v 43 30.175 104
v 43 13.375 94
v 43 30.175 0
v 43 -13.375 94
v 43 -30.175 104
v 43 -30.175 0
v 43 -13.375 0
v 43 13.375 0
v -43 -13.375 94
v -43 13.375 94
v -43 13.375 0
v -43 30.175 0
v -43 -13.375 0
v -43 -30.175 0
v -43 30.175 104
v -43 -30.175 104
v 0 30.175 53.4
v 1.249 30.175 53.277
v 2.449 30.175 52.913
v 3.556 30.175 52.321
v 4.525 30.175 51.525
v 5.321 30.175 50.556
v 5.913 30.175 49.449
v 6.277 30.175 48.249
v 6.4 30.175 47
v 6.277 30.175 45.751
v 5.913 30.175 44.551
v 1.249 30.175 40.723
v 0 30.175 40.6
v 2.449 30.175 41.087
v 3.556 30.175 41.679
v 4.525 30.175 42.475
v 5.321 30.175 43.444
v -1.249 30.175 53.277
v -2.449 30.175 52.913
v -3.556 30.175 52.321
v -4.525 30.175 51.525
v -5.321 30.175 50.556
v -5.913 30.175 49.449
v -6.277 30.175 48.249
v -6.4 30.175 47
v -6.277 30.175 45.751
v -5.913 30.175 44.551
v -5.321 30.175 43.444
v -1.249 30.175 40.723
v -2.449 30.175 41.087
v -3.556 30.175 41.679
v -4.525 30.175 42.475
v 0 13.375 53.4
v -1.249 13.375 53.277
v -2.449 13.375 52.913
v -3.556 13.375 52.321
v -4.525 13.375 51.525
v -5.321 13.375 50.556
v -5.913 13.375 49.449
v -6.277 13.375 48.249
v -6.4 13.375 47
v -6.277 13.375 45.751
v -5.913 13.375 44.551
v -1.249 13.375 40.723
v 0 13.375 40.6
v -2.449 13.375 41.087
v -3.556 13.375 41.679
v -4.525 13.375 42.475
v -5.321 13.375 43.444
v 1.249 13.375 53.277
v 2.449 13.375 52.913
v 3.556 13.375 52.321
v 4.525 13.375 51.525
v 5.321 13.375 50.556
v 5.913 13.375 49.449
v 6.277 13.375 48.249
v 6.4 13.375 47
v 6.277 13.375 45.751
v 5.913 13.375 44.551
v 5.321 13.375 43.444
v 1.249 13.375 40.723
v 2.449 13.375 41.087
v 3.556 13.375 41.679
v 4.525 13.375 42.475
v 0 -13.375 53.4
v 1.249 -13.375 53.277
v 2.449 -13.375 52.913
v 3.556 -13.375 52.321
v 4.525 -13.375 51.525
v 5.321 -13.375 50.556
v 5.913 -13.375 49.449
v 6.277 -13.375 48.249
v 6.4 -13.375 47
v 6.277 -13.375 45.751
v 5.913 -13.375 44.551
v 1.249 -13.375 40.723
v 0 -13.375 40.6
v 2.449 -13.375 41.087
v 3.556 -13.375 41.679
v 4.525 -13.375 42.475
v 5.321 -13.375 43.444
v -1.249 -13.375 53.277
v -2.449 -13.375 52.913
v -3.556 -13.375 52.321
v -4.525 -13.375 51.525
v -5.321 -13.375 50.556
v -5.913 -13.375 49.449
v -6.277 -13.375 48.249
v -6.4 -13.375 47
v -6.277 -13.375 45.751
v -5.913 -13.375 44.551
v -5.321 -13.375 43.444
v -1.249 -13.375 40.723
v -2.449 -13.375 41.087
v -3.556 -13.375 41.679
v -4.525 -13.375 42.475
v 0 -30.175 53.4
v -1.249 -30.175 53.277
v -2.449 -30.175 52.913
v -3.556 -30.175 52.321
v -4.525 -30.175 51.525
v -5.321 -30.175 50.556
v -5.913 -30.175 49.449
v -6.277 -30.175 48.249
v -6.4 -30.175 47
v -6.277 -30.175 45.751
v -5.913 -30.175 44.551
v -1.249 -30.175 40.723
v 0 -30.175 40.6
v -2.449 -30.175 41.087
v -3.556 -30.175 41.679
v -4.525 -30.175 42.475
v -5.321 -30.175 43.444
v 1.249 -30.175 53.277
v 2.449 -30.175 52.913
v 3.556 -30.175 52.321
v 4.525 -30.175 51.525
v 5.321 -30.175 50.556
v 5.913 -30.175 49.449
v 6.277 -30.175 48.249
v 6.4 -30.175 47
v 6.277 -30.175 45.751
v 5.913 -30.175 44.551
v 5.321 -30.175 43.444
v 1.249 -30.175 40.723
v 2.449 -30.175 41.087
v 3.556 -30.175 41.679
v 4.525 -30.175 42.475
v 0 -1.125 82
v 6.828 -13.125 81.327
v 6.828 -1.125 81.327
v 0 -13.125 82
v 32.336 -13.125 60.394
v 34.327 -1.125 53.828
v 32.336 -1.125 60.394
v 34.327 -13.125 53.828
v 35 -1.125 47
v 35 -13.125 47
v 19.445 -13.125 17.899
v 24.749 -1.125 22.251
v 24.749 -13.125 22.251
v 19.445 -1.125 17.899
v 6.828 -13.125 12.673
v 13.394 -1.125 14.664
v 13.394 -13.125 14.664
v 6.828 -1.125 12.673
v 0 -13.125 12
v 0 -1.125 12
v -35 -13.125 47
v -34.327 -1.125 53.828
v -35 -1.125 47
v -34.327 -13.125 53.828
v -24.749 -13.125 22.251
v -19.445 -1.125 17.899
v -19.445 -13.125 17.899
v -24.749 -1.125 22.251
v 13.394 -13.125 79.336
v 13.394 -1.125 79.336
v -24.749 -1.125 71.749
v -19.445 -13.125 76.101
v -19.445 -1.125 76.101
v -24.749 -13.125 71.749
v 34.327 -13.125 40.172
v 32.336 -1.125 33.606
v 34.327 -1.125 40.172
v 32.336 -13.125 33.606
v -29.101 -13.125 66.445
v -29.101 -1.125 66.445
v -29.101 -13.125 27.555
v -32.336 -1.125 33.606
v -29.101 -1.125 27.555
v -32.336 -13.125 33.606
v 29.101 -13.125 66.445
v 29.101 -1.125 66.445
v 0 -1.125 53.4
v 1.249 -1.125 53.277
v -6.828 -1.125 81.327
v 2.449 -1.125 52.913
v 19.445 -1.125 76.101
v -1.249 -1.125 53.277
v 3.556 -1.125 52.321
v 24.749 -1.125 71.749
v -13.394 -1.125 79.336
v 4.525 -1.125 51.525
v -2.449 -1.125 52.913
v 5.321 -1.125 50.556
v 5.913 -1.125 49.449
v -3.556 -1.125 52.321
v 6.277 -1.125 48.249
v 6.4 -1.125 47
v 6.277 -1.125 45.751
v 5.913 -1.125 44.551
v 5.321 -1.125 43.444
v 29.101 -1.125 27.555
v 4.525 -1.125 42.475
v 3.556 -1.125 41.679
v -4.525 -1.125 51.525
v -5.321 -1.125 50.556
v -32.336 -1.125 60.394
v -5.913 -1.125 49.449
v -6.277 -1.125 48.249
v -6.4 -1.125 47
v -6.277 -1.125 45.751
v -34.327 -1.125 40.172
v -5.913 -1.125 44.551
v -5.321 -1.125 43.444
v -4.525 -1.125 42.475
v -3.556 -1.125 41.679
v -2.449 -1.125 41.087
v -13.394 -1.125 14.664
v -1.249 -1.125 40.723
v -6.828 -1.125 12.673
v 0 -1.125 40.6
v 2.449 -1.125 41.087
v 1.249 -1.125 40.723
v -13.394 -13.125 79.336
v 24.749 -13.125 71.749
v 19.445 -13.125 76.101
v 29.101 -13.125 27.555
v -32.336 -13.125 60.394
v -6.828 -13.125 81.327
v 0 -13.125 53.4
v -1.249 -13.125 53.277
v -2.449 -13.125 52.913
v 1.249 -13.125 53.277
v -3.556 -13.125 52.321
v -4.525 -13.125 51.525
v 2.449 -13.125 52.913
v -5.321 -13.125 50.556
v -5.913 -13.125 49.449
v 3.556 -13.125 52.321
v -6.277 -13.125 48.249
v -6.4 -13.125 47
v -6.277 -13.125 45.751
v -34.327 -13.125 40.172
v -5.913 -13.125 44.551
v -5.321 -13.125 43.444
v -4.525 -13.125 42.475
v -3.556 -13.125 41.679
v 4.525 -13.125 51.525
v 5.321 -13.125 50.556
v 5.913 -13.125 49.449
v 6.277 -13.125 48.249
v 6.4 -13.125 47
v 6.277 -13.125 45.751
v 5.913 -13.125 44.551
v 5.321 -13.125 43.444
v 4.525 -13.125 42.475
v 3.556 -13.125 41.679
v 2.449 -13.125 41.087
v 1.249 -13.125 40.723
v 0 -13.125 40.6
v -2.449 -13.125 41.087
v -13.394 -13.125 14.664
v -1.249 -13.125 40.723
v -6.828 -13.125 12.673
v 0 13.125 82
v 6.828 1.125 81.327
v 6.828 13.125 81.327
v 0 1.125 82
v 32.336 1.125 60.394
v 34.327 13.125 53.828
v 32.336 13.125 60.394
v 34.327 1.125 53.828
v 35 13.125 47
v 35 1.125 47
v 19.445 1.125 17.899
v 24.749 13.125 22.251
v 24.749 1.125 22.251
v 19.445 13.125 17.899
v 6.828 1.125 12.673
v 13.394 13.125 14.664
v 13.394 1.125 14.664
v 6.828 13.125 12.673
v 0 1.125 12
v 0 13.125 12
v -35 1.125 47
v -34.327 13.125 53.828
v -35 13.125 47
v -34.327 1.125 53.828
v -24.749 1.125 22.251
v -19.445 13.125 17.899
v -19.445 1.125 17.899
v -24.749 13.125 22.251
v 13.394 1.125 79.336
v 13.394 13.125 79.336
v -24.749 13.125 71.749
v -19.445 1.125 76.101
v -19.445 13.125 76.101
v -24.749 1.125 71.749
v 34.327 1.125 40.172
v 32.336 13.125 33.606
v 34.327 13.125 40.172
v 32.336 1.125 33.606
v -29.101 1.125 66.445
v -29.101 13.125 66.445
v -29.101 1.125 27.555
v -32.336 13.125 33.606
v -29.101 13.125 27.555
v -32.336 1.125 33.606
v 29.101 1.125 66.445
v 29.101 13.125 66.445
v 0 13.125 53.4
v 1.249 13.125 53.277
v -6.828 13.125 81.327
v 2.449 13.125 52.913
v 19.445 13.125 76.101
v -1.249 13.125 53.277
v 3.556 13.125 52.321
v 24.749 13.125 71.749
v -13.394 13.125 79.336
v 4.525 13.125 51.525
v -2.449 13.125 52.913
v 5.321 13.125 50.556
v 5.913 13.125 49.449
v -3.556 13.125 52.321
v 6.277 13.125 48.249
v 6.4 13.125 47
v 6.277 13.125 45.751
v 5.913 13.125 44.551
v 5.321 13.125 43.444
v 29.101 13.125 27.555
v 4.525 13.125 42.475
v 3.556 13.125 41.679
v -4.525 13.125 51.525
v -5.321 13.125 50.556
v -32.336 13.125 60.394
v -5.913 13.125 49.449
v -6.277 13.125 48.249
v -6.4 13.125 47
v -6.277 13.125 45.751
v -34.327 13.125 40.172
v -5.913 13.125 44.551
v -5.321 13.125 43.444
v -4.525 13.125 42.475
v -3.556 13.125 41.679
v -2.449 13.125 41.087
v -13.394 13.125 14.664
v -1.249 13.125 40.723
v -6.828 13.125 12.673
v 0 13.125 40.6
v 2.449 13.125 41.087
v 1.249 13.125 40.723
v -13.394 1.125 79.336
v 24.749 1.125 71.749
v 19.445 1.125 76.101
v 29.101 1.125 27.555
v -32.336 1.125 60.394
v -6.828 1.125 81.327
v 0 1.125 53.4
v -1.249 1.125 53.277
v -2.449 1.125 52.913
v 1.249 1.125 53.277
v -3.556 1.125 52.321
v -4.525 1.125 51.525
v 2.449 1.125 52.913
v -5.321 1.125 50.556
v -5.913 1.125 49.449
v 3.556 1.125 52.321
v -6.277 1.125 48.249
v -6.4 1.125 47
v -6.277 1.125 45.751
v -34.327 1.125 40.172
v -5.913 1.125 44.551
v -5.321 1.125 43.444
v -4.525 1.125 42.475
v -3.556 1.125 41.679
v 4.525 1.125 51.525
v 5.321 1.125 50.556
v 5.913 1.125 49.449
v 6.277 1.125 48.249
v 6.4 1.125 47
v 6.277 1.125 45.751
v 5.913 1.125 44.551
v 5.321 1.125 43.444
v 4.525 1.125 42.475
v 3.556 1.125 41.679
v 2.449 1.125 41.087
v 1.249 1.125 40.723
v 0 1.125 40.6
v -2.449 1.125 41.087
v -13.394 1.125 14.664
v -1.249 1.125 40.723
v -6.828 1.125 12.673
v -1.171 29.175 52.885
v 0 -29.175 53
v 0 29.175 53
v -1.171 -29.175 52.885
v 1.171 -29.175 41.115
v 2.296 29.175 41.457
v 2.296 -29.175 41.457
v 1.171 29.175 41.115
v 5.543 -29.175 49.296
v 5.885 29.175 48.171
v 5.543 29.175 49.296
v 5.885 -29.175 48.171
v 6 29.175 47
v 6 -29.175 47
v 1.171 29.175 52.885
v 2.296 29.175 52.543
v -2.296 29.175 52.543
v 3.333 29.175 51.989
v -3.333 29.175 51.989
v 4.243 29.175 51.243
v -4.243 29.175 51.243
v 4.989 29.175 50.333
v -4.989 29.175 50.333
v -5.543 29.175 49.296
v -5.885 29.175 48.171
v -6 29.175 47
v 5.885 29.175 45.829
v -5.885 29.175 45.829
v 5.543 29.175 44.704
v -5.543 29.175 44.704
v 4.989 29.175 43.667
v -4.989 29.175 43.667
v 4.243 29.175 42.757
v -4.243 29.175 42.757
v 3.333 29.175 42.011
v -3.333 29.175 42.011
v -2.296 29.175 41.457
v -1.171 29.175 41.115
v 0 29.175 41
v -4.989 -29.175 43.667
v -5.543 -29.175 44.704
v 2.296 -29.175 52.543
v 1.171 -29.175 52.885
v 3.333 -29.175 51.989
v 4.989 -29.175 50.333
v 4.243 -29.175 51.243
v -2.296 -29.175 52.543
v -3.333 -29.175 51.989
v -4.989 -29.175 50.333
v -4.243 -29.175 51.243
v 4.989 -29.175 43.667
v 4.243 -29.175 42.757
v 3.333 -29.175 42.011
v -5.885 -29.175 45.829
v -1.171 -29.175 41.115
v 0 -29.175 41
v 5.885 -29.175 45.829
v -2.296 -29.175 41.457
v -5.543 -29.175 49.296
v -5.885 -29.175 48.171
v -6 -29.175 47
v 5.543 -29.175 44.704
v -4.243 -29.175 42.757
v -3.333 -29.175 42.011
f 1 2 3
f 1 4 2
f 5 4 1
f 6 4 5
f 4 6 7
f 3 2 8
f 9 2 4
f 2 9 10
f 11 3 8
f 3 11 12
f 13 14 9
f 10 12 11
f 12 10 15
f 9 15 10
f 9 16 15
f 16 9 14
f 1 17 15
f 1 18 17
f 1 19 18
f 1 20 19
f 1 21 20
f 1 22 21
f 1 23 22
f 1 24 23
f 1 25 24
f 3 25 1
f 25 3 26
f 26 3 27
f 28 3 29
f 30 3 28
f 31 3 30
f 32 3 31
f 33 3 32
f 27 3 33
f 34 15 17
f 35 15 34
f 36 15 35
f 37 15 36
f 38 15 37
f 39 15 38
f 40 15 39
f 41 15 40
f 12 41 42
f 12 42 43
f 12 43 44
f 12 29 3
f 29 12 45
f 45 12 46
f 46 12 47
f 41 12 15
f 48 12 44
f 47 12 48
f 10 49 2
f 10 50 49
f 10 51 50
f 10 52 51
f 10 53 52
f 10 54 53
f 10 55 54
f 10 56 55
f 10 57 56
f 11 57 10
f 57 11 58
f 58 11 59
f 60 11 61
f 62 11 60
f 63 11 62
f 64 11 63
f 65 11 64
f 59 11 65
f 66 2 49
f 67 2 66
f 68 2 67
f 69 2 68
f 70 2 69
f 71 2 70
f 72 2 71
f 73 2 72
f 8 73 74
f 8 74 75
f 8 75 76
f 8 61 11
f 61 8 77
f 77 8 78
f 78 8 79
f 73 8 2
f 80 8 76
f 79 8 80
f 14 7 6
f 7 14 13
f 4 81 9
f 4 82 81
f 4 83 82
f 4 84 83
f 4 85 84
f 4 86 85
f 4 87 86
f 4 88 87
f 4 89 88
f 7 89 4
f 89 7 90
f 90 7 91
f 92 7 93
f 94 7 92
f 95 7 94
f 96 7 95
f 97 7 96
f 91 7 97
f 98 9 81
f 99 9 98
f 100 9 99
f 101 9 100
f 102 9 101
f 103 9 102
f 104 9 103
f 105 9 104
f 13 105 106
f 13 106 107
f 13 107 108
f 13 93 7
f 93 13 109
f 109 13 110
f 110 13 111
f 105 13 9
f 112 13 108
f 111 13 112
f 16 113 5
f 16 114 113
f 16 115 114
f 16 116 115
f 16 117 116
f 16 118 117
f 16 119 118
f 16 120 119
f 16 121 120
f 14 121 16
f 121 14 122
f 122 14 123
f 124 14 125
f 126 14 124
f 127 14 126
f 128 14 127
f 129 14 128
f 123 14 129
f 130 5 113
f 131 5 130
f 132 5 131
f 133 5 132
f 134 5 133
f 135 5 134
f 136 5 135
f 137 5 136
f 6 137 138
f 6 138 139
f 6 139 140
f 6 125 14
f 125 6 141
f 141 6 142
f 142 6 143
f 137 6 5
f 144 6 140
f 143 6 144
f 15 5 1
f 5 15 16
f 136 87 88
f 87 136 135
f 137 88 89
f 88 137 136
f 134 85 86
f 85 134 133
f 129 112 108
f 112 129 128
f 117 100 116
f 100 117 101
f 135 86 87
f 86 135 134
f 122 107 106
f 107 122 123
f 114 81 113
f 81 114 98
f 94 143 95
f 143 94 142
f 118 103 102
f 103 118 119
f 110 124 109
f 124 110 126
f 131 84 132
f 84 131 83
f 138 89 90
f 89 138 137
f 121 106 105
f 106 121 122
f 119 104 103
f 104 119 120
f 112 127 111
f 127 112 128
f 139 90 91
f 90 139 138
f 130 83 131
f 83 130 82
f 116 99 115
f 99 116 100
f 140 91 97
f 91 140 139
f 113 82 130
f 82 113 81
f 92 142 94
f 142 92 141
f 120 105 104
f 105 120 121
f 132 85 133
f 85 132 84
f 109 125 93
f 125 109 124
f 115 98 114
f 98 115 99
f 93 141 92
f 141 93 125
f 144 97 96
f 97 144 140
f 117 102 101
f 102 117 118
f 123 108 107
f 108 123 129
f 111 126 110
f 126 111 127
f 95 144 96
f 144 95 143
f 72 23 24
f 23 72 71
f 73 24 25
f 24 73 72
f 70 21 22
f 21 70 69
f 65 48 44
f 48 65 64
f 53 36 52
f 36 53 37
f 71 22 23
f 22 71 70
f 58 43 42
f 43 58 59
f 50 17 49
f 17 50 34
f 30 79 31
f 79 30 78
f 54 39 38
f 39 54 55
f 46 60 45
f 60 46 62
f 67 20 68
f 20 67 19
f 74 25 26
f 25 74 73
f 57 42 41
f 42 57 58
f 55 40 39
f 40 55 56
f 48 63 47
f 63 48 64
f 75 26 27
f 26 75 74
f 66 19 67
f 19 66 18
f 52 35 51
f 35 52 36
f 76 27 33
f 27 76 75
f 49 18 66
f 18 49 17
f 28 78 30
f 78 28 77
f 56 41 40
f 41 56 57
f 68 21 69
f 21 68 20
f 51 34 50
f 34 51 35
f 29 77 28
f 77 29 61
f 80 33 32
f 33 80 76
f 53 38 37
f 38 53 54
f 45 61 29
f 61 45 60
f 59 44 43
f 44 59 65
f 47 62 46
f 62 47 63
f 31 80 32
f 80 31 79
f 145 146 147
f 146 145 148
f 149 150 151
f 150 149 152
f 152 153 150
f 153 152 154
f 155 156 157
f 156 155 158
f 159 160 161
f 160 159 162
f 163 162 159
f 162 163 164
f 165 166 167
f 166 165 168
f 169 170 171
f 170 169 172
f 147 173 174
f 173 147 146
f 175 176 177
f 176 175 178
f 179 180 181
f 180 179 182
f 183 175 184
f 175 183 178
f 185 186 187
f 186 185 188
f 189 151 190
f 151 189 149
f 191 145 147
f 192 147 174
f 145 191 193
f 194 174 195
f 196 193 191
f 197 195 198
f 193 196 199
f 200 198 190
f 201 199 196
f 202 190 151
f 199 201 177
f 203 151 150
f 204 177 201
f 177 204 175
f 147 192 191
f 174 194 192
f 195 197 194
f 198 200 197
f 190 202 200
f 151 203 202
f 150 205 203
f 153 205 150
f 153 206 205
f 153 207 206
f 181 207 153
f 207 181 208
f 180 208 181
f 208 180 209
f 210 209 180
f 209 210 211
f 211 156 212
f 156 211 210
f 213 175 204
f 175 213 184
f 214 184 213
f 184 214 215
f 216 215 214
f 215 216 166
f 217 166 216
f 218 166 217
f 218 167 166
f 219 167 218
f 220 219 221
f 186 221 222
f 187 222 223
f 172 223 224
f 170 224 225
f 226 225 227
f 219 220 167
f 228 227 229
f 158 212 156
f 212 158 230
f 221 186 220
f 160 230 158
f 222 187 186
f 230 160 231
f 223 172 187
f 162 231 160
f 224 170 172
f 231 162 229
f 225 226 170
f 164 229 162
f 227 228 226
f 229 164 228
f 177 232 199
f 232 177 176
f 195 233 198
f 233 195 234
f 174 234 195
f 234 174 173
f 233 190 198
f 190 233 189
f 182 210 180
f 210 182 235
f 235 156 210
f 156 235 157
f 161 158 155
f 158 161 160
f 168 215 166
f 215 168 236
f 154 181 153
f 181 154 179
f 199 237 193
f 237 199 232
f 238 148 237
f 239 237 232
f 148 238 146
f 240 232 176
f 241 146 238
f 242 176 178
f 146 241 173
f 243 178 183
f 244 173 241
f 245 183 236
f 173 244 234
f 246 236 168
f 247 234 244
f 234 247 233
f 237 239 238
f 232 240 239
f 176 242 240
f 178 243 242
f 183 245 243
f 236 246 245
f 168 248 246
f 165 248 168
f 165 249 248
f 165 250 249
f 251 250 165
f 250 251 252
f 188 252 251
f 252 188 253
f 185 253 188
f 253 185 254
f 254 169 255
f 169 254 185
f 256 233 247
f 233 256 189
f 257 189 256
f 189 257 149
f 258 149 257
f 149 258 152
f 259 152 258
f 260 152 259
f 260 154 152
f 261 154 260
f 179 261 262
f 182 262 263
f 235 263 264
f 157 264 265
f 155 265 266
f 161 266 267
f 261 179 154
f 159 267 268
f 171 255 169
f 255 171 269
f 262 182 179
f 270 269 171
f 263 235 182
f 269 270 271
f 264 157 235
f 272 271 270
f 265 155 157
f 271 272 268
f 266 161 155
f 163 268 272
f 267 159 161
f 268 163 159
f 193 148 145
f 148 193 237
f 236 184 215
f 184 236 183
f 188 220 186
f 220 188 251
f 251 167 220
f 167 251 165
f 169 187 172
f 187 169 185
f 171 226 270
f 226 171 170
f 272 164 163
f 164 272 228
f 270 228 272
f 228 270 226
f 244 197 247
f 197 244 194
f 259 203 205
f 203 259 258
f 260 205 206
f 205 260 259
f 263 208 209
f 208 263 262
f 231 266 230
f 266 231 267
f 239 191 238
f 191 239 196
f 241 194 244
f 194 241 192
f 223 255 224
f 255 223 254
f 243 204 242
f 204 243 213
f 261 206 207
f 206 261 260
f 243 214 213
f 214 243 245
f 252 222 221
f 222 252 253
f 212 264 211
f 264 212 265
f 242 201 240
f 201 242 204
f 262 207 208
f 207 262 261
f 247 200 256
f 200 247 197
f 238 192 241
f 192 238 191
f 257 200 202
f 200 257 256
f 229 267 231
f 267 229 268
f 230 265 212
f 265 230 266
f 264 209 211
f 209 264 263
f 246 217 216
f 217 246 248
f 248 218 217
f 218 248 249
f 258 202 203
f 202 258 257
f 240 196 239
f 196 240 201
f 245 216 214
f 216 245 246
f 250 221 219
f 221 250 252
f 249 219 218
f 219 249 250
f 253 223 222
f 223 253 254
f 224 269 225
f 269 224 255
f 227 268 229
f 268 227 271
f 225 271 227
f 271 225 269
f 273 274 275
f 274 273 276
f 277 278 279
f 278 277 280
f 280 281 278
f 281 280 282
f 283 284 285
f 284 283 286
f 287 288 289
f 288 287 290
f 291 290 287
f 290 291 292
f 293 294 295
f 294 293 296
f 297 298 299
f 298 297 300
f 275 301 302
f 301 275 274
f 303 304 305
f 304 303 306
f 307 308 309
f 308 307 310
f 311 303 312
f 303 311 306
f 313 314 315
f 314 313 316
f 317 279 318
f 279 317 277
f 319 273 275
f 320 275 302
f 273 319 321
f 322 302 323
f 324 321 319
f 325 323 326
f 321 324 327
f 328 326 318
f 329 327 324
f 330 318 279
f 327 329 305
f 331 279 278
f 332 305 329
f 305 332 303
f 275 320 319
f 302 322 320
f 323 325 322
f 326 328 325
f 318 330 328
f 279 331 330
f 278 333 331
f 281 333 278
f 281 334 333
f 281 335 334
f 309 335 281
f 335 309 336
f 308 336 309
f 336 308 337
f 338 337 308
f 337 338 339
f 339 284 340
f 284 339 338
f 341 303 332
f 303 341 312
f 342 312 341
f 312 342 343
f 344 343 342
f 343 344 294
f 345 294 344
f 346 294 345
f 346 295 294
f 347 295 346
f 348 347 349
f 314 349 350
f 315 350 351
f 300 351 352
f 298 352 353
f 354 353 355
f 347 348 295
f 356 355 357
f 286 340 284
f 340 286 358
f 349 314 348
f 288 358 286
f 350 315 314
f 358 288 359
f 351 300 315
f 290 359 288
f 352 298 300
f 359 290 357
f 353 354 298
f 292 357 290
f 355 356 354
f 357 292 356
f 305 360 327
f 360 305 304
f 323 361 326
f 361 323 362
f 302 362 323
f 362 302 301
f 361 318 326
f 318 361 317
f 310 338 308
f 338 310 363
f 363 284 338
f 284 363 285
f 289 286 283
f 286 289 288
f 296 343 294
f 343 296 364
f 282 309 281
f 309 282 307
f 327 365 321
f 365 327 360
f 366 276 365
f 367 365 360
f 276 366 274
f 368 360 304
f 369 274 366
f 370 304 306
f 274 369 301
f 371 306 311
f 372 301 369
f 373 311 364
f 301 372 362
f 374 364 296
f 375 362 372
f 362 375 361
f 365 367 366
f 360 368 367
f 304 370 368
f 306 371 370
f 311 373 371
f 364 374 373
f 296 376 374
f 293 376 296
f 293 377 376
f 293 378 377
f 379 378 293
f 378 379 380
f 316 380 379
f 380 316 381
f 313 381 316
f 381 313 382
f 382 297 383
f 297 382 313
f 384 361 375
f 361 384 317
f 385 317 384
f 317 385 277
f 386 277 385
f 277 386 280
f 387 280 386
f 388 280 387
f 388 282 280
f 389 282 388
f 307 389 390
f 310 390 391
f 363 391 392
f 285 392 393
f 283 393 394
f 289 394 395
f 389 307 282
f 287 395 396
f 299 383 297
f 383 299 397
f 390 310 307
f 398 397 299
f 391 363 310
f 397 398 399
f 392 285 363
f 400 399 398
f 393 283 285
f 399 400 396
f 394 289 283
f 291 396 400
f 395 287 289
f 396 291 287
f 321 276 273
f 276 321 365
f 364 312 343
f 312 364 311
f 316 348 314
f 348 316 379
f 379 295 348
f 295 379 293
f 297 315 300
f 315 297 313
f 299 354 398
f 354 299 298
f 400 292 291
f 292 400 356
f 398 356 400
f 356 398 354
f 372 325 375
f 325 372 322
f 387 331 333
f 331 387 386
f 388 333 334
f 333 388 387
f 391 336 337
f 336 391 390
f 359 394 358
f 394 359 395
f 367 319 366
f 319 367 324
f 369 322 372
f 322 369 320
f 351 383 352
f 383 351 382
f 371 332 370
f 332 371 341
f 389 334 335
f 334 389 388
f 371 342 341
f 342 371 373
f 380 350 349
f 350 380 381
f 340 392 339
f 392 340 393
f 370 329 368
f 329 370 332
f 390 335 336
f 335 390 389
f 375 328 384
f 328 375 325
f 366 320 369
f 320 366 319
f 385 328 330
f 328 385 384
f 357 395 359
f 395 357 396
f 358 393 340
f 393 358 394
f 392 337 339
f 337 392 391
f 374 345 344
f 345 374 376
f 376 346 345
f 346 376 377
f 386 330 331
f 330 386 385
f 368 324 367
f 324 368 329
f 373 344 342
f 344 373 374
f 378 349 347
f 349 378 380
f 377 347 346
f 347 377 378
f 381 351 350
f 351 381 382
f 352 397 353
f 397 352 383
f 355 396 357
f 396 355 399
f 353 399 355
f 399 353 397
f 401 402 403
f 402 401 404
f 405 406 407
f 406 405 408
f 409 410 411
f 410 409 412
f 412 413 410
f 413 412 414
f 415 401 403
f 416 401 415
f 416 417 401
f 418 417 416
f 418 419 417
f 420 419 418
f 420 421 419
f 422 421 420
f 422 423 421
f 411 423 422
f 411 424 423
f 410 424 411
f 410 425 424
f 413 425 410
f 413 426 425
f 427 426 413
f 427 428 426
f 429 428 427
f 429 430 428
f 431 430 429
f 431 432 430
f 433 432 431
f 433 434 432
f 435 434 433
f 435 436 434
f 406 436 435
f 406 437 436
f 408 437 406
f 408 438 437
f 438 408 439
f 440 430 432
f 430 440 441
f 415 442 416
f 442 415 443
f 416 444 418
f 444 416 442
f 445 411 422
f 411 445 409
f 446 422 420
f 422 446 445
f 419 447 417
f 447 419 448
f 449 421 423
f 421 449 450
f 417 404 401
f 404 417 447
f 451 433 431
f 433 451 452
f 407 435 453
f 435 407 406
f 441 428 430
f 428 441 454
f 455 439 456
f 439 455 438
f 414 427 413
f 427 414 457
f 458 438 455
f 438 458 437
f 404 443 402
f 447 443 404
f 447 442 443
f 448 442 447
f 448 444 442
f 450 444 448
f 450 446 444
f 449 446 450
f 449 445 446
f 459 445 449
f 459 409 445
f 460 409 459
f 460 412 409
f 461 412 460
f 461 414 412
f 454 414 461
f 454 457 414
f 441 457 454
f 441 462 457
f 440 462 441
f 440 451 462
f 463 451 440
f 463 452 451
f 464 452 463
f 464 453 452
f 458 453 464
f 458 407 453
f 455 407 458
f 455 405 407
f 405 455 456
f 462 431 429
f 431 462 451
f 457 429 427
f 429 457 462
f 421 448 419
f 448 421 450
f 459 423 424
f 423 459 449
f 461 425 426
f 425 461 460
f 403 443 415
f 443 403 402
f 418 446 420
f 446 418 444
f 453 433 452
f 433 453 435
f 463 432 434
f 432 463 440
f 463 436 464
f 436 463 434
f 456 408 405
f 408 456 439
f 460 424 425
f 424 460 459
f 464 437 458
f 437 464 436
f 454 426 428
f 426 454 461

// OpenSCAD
$fn = 32;

// ------------------------------------------------------------------------
// Trolley wheel set: wheels d70, fork 94 mm tall
// Every part is its own module, assembly() places every instance.
// ------------------------------------------------------------------------

// --- part 1 ---
module trolley_fork() {
  difference() {
    union() {
      translate([-43, 13.375, 0]) cube([86, 16.8, 94]);
      translate([-43, -30.175, 0]) cube([86, 16.8, 94]);
      translate([-43, -30.175, 94]) cube([86, 60.35, 10]);
    }
    translate([0, -21.775, 47]) rotate([90, 0, 0]) cylinder(h = 18.8, d = 12.8, center = true);
    translate([0, 21.775, 47]) rotate([90, 0, 0]) cylinder(h = 18.8, d = 12.8, center = true);
  }
}

// --- part 2 ---
module trolley_wheel() {
  difference() {
      translate([0, 0, 0]) cylinder(h = 12, d = 70);
      translate([0, 0, -1]) cylinder(h = 14, d = 12.8);
    }
}

// --- part 3 ---
module trolley_axle() {
  translate([0, 0, -29.175]) cylinder(h = 58.35, d = 12);
}

// --- assembly ---
module assembly() {
  color([0.80, 0.24, 0.20]) translate([0, 0, 0]) rotate([0, 0, 0]) trolley_fork();
  color([0.20, 0.45, 0.75]) translate([0, -1.125, 47]) rotate([90, 0, 0]) trolley_wheel();
  color([0.25, 0.62, 0.32]) translate([0, 13.125, 47]) rotate([90, 0, 0]) trolley_wheel();
  color([0.92, 0.70, 0.18]) translate([0, 0, 47]) rotate([90, 0, 0]) trolley_axle();
}

assembly();
